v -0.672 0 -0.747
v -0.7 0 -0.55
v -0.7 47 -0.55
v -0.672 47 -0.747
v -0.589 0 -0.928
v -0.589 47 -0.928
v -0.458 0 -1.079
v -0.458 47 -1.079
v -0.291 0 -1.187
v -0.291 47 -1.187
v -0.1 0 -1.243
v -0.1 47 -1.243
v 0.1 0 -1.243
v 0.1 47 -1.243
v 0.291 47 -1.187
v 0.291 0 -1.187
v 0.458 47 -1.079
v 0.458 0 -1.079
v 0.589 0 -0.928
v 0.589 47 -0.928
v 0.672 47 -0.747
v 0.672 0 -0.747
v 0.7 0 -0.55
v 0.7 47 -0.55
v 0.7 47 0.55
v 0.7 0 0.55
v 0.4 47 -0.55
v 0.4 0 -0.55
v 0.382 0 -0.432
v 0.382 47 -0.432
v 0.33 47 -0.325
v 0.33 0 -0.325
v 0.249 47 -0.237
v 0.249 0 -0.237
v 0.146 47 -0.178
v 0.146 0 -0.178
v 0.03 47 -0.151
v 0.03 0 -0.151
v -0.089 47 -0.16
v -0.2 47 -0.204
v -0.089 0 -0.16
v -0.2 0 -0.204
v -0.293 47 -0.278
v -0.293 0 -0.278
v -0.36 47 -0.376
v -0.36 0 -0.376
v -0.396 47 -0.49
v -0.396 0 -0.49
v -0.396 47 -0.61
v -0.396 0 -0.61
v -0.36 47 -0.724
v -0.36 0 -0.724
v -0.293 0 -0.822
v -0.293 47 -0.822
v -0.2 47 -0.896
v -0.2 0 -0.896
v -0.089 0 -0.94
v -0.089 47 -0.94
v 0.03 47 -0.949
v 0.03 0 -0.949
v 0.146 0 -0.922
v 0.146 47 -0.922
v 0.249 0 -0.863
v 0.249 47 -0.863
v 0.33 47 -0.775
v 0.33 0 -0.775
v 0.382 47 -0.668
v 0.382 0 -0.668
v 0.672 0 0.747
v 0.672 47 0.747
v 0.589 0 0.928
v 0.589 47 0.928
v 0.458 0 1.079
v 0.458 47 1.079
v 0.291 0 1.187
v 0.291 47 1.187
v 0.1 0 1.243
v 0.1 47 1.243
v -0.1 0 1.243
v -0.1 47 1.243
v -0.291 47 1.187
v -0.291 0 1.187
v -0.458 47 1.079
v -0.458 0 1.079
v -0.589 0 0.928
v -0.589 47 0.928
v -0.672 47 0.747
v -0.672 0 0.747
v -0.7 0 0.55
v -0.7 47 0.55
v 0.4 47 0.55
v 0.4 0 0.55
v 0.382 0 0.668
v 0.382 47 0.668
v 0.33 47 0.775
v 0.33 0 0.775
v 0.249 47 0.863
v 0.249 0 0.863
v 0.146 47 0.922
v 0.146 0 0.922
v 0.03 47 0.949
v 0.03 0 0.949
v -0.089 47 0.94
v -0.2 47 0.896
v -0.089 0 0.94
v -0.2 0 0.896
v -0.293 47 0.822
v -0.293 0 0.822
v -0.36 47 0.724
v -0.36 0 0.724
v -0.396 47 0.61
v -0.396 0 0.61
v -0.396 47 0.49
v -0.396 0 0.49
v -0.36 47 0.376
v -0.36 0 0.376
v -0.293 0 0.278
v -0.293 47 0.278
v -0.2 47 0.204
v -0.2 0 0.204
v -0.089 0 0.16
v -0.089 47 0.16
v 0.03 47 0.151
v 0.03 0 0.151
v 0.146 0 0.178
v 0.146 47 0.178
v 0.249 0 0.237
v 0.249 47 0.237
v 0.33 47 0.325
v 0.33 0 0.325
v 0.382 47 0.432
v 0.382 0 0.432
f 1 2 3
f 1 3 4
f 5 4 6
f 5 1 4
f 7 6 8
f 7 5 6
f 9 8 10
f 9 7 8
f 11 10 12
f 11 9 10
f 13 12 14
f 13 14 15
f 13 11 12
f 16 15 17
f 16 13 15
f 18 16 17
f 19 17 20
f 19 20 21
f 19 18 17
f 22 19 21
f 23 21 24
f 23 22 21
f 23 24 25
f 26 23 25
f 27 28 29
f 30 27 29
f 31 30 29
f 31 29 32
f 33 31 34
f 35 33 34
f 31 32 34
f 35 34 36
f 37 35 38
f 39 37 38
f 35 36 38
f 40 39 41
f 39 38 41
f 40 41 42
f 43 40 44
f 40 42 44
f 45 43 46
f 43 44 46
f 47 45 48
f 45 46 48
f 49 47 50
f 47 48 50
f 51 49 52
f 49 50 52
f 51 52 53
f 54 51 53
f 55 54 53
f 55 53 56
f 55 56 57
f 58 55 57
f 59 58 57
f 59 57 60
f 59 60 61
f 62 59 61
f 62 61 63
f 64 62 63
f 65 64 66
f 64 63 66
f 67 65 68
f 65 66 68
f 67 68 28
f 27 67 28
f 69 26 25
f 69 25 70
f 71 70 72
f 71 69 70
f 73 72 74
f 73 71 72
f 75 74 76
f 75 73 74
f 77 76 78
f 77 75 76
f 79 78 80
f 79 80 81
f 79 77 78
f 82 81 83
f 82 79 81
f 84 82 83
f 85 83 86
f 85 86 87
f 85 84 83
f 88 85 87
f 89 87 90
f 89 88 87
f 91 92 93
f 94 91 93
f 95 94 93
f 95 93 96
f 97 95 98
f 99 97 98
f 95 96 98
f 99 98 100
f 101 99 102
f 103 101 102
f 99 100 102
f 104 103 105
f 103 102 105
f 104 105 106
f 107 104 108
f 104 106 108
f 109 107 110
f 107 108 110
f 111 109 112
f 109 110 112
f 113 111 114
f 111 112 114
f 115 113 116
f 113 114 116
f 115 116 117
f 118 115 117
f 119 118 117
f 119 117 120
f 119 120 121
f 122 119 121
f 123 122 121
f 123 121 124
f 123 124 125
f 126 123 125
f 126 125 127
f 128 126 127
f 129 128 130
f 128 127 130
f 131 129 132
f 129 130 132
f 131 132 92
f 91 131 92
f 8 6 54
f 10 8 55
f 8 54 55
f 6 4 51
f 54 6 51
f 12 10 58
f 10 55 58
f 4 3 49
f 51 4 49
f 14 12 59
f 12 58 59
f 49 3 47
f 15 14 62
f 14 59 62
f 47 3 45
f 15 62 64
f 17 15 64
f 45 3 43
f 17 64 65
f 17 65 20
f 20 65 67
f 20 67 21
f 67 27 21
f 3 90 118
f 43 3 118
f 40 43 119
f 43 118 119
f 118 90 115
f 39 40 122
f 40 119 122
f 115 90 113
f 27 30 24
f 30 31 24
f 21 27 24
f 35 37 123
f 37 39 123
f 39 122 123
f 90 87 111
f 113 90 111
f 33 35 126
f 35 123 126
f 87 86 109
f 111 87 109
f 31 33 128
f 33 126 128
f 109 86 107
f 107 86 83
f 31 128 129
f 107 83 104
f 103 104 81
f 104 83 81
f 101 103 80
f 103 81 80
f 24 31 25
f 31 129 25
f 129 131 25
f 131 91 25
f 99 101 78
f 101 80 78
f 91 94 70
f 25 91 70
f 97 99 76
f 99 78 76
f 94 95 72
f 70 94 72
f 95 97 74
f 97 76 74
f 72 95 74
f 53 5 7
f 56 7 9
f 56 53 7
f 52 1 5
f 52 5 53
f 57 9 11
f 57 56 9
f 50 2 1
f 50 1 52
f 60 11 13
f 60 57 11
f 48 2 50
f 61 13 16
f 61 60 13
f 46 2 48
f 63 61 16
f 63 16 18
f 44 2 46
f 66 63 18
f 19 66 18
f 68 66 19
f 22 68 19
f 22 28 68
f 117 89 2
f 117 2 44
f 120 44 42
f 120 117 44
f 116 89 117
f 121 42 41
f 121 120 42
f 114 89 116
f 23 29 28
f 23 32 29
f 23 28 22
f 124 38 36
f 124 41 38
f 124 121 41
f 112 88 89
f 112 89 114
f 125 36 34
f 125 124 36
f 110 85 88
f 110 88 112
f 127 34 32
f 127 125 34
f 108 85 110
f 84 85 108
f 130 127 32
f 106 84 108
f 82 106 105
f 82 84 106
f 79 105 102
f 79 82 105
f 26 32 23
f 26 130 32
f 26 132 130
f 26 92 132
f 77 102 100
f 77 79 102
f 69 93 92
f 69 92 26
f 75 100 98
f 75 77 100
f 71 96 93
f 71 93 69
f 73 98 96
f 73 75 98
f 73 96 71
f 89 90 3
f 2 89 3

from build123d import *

# Parameters (mm, degrees)
F0_R     = 0.4
F1_DEPTH = 47


with BuildPart() as f1:
    # F0 (on Front) → F1 (new body)
    with BuildSketch(Plane.XZ):
        with BuildLine():
            Line((-0.7, 0.55), (-0.7, -0.55))
            ThreePointArc((-0.7, -0.55), (0, -1.25), (0.7, -0.55))
            Line((0.7, -0.55), (0.7, 0.55))
            ThreePointArc((0.7, 0.55), (0, 1.25), (-0.7, 0.55))
        make_face()
        with Locations((0, -0.55)):
            Circle(F0_R, mode=Mode.SUBTRACT)
        with Locations((0, 0.55)):
            Circle(F0_R, mode=Mode.SUBTRACT)
    extrude(amount=-F1_DEPTH)


solid = f1.part
